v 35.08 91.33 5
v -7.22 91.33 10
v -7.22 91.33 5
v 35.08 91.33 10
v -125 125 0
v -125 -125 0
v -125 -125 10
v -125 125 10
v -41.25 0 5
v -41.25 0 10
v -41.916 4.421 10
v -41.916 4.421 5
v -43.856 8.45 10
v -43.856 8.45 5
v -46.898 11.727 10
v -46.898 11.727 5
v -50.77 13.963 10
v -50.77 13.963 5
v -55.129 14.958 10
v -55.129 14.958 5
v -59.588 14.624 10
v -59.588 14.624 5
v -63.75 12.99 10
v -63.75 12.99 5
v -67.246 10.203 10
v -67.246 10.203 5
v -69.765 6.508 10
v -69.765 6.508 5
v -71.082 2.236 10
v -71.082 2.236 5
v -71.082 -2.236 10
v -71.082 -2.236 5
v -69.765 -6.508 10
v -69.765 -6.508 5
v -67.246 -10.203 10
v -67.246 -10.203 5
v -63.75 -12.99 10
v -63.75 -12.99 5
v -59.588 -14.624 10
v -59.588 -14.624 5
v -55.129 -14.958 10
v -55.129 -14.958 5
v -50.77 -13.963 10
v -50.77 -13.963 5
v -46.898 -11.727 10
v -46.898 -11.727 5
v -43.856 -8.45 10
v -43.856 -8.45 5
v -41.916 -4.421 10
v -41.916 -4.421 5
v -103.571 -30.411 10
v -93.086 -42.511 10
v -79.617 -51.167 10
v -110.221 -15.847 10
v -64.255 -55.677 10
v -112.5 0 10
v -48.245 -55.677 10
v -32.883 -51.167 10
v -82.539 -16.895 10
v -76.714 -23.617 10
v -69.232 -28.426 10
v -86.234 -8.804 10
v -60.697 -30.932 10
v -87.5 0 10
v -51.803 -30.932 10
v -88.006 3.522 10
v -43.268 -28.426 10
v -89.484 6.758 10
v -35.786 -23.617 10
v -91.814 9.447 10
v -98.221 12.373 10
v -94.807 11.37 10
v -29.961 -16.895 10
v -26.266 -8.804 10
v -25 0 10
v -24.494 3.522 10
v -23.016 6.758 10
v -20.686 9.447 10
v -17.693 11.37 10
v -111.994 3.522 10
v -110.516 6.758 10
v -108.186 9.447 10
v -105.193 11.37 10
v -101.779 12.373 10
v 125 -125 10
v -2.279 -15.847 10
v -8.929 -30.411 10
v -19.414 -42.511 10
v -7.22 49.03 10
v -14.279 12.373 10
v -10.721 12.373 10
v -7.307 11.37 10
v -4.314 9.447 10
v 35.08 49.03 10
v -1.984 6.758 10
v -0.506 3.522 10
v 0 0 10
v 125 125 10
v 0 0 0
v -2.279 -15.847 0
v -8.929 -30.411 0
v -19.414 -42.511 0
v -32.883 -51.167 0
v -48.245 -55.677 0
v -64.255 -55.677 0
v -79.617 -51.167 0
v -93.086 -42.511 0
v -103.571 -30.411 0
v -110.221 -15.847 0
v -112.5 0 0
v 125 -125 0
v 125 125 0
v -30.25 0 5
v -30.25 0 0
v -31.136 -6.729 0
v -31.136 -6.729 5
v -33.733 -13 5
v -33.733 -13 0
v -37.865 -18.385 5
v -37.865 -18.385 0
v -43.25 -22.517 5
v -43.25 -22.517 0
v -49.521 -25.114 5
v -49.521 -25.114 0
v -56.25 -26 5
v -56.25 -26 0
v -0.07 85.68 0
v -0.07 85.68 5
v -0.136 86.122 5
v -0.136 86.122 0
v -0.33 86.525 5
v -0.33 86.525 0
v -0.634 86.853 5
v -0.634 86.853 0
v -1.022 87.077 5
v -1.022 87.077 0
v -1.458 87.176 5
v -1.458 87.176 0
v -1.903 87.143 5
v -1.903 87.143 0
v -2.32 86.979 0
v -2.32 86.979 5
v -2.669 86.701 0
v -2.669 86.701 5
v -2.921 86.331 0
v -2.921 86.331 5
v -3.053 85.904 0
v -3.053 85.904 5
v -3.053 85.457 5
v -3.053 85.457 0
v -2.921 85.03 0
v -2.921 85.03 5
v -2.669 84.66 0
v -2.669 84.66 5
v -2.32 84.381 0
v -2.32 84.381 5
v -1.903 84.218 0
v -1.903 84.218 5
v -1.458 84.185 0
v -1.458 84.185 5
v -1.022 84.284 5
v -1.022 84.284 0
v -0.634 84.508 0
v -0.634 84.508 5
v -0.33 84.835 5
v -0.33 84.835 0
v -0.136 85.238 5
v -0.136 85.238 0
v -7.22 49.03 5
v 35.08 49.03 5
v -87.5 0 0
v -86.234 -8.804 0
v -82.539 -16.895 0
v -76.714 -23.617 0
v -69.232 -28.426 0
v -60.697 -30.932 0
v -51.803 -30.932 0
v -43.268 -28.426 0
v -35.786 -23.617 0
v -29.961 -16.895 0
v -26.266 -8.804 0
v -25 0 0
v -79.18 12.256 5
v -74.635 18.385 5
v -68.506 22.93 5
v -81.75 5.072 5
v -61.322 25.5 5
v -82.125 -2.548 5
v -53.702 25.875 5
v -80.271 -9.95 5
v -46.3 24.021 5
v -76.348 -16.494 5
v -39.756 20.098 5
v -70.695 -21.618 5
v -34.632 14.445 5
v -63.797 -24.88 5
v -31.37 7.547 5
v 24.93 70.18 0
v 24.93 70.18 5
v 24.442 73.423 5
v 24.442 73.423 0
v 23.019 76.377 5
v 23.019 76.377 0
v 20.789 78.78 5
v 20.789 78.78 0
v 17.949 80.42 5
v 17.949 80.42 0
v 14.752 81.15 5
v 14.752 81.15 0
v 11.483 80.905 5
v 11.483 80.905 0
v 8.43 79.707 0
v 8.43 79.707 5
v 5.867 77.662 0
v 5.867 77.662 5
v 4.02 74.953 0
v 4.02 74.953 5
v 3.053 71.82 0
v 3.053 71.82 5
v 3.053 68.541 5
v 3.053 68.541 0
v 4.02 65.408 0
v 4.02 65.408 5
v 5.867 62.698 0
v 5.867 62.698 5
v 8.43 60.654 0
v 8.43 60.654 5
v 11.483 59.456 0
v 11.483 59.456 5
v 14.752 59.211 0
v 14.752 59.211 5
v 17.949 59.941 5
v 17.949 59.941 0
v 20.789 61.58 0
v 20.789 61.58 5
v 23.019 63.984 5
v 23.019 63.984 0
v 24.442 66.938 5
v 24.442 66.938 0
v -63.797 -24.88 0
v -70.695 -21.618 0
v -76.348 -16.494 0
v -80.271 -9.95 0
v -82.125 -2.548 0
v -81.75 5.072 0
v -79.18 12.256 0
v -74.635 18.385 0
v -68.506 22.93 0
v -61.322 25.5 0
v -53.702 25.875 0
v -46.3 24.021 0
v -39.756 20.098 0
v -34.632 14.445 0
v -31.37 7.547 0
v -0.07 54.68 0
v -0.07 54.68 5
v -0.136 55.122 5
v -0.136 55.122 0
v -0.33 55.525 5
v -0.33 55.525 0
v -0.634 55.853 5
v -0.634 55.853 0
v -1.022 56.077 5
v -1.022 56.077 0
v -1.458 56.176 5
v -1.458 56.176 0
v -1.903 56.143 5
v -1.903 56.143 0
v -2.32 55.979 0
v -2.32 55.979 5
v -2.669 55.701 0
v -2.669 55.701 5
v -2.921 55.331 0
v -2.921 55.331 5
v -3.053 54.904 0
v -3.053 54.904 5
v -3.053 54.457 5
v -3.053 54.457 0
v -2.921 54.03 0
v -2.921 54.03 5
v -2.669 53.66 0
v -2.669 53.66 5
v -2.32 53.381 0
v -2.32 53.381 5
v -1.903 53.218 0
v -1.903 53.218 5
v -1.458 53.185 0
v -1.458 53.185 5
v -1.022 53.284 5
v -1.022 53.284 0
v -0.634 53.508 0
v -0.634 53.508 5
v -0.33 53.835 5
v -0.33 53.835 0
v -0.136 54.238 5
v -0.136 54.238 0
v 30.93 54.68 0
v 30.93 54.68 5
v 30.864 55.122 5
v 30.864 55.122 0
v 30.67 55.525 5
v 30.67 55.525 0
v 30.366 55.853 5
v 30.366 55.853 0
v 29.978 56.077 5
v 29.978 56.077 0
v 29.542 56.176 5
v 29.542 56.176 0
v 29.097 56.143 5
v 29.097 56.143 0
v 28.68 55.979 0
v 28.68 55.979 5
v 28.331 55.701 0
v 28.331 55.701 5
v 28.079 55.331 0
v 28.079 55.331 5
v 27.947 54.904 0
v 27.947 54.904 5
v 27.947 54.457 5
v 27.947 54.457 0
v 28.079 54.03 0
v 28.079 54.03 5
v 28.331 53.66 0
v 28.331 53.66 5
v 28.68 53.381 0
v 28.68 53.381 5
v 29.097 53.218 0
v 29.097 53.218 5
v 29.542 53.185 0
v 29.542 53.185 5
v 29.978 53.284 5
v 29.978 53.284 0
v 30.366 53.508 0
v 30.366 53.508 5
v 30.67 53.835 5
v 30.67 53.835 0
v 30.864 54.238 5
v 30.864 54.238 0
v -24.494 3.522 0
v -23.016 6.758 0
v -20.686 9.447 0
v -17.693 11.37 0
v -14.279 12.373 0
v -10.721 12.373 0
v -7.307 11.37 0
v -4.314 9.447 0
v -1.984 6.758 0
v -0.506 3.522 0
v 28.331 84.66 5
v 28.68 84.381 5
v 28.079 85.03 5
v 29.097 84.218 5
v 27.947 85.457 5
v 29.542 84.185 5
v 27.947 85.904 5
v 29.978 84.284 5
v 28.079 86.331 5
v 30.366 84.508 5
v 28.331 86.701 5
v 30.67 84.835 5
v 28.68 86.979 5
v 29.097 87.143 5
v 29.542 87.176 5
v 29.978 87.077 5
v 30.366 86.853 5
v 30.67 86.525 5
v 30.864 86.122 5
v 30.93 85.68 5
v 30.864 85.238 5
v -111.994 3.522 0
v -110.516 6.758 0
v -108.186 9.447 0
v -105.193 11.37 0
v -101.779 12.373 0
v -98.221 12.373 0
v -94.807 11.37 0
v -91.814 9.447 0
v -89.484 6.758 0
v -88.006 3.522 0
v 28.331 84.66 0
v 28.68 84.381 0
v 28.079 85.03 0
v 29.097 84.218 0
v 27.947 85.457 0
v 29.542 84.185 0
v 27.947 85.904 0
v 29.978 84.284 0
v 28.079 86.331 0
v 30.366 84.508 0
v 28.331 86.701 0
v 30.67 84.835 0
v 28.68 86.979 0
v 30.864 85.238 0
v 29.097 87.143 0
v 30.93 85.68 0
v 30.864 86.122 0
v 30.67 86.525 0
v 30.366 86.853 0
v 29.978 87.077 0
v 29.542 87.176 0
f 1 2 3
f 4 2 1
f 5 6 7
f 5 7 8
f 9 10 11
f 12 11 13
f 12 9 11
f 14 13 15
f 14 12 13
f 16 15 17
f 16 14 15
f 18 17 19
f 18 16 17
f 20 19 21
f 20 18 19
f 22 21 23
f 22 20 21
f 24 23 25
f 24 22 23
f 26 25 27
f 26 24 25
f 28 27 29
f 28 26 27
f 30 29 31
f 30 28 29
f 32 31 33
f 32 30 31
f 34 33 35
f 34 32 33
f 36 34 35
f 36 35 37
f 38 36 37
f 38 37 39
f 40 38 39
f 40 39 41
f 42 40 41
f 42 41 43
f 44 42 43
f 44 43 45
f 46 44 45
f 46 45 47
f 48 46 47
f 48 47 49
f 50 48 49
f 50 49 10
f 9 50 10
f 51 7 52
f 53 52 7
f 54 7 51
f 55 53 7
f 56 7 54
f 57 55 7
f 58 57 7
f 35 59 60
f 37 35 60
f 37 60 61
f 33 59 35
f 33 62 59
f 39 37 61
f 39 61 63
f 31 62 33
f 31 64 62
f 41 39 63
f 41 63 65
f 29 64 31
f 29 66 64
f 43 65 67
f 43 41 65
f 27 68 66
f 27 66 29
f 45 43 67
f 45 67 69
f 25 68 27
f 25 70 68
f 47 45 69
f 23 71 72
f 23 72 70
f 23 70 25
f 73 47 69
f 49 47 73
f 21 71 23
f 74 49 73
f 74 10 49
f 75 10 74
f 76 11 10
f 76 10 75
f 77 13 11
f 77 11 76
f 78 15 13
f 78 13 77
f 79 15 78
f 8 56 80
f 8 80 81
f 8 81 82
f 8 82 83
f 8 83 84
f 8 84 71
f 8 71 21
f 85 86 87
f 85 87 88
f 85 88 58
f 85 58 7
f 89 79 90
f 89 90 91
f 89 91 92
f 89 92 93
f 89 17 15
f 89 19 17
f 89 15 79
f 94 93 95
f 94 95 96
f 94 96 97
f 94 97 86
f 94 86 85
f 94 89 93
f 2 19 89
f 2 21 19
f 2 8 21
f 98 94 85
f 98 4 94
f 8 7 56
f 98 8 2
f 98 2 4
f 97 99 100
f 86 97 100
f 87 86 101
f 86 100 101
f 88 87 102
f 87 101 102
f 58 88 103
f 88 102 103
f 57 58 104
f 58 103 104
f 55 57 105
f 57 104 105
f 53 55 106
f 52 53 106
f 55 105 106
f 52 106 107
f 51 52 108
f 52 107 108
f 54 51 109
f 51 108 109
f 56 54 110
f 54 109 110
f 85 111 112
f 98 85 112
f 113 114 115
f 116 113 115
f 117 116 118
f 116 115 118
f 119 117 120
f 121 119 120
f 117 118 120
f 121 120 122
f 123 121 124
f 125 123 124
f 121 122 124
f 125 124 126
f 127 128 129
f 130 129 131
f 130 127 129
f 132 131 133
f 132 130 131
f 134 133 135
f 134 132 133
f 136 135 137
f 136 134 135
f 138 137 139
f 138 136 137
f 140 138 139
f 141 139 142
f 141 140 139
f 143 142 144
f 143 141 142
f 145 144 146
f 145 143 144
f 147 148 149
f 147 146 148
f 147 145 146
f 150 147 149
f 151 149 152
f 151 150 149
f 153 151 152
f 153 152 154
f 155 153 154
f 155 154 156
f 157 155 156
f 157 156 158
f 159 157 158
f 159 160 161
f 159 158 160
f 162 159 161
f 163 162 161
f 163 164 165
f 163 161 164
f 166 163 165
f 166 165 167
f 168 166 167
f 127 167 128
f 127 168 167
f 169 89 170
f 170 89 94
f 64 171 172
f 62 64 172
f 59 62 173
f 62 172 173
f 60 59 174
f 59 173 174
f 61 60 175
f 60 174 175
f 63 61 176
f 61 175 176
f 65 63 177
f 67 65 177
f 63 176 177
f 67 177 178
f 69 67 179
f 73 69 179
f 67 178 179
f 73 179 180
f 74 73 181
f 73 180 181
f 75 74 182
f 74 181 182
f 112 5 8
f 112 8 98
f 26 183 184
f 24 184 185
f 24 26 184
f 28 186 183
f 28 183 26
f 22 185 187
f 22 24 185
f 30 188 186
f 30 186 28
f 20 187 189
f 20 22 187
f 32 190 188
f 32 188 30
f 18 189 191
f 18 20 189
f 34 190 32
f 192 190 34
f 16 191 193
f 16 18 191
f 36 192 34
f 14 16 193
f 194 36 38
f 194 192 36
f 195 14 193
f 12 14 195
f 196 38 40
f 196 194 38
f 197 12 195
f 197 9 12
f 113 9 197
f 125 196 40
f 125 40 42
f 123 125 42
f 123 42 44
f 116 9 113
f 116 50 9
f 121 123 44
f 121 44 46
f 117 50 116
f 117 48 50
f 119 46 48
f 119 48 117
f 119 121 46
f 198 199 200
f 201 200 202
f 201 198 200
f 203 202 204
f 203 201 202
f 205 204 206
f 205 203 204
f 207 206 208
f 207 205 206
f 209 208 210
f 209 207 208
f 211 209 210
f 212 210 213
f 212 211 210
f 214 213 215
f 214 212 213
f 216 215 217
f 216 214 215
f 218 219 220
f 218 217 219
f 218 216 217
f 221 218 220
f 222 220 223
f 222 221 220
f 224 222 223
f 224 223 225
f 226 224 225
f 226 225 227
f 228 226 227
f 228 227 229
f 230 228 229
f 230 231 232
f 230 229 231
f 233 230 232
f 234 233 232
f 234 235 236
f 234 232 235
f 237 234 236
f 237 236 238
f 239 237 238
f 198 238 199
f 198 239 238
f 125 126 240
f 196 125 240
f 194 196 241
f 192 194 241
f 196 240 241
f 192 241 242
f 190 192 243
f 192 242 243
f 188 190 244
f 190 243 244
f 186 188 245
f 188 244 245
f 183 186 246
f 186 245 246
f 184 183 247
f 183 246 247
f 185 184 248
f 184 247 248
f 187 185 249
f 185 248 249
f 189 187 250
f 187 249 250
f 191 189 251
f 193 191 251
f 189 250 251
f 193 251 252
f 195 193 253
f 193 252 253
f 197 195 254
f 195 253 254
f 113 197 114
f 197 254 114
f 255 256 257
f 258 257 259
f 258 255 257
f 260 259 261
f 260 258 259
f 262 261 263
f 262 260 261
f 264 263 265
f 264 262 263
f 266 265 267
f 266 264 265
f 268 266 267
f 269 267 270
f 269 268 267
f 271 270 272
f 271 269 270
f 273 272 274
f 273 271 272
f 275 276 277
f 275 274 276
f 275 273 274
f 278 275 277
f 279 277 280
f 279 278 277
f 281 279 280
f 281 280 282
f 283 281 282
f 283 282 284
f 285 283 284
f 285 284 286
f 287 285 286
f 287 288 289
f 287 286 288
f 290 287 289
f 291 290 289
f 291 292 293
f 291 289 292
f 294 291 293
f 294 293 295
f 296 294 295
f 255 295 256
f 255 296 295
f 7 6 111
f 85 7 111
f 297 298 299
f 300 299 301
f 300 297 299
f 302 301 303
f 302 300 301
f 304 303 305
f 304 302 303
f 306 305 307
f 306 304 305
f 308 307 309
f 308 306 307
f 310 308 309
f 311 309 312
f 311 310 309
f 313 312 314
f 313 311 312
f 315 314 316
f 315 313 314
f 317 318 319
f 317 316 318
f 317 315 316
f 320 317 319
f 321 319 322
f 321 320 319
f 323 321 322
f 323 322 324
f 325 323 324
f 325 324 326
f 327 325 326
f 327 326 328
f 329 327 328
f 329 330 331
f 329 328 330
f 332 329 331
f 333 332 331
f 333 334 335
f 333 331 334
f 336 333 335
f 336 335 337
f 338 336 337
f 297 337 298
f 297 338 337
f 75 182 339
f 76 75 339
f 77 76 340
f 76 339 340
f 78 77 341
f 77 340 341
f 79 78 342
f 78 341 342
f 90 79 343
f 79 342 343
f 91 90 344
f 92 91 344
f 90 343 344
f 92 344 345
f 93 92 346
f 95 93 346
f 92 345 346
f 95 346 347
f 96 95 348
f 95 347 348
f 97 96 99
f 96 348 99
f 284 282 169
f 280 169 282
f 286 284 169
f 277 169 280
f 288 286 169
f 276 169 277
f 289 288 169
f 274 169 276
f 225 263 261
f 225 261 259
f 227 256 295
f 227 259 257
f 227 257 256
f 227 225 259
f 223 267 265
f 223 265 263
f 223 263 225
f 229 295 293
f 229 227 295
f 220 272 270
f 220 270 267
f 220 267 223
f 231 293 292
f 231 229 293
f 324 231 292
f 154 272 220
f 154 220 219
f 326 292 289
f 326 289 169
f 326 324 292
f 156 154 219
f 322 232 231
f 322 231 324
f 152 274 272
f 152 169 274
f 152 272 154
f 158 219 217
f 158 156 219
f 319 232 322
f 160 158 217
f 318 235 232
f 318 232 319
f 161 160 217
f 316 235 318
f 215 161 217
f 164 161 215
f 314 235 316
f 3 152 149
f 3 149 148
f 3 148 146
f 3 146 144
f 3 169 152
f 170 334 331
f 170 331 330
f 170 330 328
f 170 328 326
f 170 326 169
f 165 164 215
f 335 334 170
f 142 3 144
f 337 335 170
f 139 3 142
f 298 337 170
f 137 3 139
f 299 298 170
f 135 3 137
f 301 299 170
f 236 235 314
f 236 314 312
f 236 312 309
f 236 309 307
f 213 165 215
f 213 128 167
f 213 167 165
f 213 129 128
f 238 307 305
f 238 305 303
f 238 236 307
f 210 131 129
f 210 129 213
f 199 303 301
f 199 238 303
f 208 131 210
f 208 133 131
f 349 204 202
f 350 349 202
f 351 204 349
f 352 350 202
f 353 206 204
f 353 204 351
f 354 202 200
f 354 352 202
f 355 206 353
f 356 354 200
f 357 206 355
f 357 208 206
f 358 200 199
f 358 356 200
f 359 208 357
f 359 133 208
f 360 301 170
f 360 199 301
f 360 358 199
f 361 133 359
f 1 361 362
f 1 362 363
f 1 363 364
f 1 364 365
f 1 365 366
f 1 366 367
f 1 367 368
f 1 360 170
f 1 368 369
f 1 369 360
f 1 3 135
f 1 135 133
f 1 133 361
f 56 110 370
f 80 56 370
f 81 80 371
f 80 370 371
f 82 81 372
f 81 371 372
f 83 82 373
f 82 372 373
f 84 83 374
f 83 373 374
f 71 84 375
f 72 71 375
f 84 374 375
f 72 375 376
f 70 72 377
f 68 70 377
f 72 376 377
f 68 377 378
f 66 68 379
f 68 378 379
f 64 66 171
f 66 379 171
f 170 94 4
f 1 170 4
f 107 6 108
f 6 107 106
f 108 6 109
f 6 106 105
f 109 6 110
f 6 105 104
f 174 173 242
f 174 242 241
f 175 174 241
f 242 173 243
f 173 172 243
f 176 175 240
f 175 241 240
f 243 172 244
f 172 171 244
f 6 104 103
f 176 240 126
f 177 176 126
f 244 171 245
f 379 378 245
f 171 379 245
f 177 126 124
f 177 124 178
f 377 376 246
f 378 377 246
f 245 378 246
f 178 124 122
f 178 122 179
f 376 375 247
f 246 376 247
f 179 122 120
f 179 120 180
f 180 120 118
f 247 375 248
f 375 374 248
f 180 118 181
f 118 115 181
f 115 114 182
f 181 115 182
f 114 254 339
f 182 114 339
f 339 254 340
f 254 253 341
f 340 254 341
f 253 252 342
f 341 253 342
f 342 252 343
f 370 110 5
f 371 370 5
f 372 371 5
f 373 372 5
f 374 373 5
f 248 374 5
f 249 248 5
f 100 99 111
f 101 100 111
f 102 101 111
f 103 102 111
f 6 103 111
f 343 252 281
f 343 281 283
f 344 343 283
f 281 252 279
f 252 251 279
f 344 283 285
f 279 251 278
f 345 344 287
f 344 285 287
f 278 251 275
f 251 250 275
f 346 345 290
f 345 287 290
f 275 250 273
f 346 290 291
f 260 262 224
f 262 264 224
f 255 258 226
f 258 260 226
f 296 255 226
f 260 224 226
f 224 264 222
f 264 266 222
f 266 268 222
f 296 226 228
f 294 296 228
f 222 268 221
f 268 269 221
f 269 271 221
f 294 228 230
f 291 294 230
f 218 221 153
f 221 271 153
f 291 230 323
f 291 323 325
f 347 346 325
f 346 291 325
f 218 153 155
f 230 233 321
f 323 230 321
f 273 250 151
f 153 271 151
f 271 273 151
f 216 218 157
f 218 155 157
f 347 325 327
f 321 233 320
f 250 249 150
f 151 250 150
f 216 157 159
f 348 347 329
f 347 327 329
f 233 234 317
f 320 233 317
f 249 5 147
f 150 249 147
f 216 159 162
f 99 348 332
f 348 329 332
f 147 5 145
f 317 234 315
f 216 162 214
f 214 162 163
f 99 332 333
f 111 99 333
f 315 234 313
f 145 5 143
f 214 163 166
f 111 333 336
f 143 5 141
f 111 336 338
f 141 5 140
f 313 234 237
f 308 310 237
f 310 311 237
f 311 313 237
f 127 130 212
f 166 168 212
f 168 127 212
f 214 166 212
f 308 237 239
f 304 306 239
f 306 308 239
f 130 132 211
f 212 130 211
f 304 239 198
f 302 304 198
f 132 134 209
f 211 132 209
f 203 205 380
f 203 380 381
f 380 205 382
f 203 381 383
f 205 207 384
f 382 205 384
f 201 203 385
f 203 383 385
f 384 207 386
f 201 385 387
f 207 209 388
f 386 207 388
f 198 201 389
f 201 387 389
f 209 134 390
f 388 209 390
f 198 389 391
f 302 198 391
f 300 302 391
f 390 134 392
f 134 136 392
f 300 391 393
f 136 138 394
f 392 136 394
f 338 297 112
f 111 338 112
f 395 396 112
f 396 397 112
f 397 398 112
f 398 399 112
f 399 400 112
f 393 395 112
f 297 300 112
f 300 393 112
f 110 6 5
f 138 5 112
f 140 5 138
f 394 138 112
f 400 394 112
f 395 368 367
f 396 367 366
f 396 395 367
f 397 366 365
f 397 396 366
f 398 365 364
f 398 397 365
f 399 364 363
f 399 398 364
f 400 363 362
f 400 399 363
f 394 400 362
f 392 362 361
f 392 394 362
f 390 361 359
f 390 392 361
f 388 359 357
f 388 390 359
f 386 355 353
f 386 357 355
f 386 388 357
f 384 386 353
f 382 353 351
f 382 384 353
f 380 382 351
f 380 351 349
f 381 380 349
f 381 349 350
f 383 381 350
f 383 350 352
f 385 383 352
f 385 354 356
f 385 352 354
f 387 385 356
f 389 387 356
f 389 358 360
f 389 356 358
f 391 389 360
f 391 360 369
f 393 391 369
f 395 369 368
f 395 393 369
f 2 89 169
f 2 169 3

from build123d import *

# Parameters (mm, degrees)
F0_W     = 250
F0_H     = 250
F0_R     = 15
F0_R_2   = 1.5
F0_R_3   = 11
F1_DEPTH = 10
F3_W     = 42.3
F3_H     = 42.3
F4_DEPTH = 5
F5_DEPTH = 5


with BuildPart() as f1:
    # F0 (on Top) → F1 (new body)
    with BuildSketch(Plane.XY):
        Rectangle(F0_W, F0_H)
        with BuildLine():
            ThreePointArc((0, 0), (-56.25, -56.25), (-112.5, 0))
            ThreePointArc((-112.5, 0), (-100, 12.5), (-87.5, 0))
            ThreePointArc((-87.5, 0), (-56.25, -31.25), (-25, 0))
            ThreePointArc((-25, 0), (-12.5, 12.5), (0, 0))
        make_face(mode=Mode.SUBTRACT)
        with Locations((-56.25, 0)):
            Circle(F0_R, mode=Mode.SUBTRACT)
        with Locations((-1.5696519672, 54.6803480328)):
            Circle(F0_R_2, mode=Mode.SUBTRACT)
        with Locations((-1.5696519672, 85.6803480328)):
            Circle(F0_R_2, mode=Mode.SUBTRACT)
        with Locations((29.4303480328, 54.6803480328)):
            Circle(F0_R_2, mode=Mode.SUBTRACT)
        with Locations((13.9303480328, 70.1803480328)):
            Circle(F0_R_3, mode=Mode.SUBTRACT)
        with Locations((29.4303480328, 85.6803480328)):
            Circle(F0_R_2, mode=Mode.SUBTRACT)
    extrude(amount=F1_DEPTH)

    # F3 (on face) → F4 (cut)
    with BuildSketch(Plane.XY.offset(10)):
        with Locations((13.9303480328, 70.1803480328)):
            Rectangle(F3_W, F3_H)
    extrude(amount=-F4_DEPTH, mode=Mode.SUBTRACT)

    # F2 (on face) → F5 (cut)
    with BuildSketch(Plane(origin=(0, 0, 0), x_dir=(1, 0, 0), z_dir=(0, 0, -1))):
        with BuildLine():
            ThreePointArc((-30.25, 0), (-37.8652236891, 18.3847763109), (-56.25, 26))
            ThreePointArc((-56.25, 26), (-74.6347763109, -18.3847763109), (-30.25, 0))
        make_face()
        with BuildLine():
            ThreePointArc((-41.25, 0), (-66.8566017178, -10.6066017178), (-56.25, 15))
            ThreePointArc((-56.25, 15), (-45.6433982822, 10.6066017178), (-41.25, 0))
        make_face(mode=Mode.SUBTRACT)
    extrude(amount=-F5_DEPTH, mode=Mode.SUBTRACT)


with BuildPart() as f6_1:
    # F6: copy of F1
    add(f1.part)


solid = f1.part
